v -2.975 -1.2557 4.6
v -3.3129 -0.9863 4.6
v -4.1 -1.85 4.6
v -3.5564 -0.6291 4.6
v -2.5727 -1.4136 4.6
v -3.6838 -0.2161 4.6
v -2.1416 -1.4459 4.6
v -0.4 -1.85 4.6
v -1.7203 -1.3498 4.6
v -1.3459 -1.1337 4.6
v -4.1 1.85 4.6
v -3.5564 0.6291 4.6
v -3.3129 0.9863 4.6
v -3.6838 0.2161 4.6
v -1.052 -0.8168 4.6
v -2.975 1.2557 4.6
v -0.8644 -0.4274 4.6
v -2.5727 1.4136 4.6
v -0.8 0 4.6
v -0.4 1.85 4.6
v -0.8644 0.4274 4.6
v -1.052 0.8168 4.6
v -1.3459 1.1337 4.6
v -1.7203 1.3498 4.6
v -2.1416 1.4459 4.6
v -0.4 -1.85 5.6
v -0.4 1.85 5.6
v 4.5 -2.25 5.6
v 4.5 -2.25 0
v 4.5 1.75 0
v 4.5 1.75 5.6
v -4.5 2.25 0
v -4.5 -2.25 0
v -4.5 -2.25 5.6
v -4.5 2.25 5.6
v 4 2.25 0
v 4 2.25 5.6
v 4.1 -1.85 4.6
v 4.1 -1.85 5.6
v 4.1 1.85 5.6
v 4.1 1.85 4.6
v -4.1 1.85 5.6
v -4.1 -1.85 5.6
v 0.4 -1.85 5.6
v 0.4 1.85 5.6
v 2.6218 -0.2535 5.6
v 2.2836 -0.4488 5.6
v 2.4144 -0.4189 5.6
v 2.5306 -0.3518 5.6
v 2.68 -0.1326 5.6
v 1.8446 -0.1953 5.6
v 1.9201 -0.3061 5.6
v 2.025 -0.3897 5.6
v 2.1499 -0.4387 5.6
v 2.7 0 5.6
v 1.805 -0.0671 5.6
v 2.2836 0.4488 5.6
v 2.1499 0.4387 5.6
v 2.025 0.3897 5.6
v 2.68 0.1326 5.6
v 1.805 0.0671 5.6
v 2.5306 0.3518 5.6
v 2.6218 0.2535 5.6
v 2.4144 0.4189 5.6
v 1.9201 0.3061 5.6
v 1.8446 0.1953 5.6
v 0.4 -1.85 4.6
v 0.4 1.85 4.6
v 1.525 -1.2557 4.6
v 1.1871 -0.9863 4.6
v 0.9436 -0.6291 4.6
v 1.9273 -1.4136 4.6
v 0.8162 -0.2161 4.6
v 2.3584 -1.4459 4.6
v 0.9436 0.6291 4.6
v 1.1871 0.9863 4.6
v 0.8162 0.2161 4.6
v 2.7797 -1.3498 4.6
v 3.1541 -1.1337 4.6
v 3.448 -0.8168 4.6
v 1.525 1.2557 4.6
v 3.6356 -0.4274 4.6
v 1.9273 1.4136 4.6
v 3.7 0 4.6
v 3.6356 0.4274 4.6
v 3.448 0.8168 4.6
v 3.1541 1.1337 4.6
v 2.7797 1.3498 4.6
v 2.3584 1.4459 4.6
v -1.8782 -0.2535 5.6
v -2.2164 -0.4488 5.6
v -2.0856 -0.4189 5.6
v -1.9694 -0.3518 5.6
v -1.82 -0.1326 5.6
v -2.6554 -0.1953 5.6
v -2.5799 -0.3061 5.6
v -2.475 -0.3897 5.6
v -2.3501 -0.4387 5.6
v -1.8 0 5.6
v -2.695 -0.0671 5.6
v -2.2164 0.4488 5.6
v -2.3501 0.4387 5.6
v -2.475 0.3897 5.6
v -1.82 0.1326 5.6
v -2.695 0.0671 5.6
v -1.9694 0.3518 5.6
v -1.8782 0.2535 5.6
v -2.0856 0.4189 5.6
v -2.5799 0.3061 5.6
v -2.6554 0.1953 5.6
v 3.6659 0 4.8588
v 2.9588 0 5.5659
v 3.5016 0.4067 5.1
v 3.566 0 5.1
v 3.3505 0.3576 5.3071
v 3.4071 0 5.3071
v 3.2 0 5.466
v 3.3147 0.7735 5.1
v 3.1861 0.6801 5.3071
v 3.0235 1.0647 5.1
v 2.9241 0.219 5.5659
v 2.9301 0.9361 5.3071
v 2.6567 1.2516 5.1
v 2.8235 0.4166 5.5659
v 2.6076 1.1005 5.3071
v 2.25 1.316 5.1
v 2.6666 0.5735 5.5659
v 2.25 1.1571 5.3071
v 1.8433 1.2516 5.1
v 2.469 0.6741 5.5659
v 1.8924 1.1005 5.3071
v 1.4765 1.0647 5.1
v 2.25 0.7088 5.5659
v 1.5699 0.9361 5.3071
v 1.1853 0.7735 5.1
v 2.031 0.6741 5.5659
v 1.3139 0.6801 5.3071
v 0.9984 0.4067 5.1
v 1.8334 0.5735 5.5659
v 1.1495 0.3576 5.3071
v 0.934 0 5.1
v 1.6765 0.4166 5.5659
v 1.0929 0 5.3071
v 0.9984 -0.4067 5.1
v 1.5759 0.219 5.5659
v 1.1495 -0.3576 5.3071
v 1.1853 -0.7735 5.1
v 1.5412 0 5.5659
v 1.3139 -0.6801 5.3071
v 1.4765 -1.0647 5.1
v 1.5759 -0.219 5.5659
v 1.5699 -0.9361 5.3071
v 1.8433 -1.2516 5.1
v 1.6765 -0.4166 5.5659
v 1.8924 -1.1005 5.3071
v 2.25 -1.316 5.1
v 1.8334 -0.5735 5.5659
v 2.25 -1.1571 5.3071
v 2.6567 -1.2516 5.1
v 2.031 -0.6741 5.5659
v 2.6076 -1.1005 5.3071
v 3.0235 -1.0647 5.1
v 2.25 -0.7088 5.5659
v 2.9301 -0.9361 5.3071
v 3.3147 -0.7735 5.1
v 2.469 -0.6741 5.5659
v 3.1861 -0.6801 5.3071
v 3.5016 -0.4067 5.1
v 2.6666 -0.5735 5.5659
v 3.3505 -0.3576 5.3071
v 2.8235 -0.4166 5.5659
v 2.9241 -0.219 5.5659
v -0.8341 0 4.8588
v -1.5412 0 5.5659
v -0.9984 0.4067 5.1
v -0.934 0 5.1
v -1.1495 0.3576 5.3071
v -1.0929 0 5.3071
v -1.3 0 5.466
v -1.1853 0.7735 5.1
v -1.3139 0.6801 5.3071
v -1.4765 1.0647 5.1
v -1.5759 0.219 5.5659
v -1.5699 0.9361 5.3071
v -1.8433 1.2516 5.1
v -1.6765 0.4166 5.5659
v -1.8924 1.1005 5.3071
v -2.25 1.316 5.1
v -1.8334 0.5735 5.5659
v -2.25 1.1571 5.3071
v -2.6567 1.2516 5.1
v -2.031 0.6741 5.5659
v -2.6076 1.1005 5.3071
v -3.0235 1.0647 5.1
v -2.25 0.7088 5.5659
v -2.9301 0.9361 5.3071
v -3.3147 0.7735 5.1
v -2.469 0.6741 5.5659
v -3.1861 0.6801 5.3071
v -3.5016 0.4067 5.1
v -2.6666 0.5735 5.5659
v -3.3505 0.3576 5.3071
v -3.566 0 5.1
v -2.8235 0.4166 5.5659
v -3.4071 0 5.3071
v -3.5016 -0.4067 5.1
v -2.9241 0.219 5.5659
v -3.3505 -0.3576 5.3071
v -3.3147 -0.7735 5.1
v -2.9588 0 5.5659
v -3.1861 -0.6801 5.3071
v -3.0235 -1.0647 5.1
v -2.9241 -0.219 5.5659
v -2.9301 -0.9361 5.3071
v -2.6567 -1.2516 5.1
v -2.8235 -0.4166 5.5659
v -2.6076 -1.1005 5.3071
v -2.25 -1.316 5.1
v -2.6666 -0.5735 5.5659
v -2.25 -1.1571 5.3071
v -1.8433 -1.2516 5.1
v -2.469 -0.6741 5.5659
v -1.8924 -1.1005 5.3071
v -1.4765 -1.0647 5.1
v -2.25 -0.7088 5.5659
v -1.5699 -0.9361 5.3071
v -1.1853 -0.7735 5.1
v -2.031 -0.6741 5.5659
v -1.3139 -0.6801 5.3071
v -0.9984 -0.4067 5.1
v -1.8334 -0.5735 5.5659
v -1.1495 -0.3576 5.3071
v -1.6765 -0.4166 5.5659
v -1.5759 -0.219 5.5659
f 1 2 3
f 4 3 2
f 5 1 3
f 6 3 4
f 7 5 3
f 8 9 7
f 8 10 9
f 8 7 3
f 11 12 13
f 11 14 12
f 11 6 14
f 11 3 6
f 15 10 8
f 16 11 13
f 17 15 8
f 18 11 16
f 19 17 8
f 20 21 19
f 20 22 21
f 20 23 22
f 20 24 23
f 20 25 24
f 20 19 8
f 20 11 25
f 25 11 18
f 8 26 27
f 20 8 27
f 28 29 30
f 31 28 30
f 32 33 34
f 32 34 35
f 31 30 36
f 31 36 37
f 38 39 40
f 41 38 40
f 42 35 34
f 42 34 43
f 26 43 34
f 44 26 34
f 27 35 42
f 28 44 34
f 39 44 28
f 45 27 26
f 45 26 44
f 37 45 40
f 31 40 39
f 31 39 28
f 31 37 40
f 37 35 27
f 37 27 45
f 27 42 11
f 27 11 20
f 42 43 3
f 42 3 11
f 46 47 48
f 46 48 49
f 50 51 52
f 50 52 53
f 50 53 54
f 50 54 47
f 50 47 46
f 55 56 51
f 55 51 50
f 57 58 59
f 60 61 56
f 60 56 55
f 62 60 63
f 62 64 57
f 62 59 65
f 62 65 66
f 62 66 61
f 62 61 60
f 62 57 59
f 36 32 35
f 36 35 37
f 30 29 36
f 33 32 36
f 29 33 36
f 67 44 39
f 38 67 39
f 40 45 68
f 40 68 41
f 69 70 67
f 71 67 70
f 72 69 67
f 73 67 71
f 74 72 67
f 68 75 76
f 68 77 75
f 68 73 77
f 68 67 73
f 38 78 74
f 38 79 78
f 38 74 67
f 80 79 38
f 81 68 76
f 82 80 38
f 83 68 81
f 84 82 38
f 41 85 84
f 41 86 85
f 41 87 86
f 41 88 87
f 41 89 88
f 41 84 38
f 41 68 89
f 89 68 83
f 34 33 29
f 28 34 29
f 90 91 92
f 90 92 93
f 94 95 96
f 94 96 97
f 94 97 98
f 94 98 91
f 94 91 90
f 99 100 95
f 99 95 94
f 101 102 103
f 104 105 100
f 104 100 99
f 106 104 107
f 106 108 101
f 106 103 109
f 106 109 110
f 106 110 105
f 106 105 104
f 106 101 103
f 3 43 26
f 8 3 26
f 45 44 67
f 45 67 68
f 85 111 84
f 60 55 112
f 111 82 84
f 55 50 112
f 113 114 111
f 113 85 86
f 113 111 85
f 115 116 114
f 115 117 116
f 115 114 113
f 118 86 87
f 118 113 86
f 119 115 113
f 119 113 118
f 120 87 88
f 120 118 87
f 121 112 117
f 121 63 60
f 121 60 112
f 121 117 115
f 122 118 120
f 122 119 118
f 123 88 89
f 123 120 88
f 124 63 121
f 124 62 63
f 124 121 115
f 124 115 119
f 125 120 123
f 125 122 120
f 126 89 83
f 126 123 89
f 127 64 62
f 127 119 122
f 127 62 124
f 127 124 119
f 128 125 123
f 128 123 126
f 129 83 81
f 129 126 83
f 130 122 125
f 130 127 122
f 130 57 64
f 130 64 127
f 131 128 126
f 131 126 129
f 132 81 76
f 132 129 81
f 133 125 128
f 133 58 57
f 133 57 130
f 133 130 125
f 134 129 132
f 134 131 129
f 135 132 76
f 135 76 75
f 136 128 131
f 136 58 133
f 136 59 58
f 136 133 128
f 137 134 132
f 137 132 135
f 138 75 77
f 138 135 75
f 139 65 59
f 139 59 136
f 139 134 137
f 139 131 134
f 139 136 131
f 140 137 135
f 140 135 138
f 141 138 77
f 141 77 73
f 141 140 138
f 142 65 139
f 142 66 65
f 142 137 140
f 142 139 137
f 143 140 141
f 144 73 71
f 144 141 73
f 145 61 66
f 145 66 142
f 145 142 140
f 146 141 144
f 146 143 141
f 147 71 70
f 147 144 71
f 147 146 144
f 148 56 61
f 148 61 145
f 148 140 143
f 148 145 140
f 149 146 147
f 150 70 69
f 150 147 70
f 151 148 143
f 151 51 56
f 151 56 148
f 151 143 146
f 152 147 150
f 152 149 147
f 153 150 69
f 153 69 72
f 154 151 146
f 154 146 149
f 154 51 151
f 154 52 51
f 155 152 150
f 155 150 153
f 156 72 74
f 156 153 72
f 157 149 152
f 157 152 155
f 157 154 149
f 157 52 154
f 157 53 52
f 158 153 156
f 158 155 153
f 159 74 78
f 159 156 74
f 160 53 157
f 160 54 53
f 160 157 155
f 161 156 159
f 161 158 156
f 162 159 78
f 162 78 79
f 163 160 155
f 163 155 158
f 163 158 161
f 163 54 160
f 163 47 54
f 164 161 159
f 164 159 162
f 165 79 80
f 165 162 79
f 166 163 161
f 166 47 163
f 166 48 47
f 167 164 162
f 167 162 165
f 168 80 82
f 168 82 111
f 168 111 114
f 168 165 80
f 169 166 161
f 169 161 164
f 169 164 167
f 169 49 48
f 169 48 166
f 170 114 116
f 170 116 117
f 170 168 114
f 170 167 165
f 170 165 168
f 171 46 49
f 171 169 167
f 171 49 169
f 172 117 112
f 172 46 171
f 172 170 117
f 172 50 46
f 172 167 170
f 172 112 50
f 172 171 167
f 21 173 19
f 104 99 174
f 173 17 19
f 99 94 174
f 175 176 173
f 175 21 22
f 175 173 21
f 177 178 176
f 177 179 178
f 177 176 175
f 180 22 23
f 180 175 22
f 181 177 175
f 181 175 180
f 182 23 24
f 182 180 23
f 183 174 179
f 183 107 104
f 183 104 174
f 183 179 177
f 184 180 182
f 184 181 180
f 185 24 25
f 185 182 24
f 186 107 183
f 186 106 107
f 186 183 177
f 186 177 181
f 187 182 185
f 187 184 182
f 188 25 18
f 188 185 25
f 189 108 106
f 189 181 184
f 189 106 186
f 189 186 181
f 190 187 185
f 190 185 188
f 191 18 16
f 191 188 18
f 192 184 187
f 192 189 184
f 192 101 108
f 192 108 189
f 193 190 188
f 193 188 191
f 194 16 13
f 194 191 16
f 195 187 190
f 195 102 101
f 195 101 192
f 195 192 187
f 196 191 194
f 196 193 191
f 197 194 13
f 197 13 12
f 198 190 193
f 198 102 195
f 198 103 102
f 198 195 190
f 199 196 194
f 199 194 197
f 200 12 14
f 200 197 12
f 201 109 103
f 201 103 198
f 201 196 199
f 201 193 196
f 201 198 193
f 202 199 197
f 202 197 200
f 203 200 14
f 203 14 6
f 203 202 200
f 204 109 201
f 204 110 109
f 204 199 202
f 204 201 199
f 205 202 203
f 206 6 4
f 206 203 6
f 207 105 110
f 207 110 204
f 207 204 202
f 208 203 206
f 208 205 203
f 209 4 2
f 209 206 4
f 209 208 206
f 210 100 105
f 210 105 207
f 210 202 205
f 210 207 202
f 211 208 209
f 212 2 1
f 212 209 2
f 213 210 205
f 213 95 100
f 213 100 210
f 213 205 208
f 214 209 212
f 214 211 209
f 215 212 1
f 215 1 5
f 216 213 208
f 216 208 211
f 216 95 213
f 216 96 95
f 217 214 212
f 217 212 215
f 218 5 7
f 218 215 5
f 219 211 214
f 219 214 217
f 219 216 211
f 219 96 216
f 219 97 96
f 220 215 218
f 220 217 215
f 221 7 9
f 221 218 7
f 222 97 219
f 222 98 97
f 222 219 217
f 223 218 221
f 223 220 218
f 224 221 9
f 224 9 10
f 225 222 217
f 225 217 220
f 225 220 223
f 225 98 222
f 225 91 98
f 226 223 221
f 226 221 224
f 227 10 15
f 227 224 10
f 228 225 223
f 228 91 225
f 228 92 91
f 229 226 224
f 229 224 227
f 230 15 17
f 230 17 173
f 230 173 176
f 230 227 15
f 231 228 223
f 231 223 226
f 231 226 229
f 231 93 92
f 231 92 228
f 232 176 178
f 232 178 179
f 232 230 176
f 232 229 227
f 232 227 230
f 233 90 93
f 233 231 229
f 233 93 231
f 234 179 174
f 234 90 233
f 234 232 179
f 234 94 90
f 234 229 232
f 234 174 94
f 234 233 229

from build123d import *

# Parameters (mm, degrees)
F0_W     = 9
F0_H     = 4.5
F1_DEPTH = 5.6
F2_W     = 3.7
F2_H     = 3.7
F2_R     = 1.45
F3_DEPTH = 1
F4_R     = 0.99999
F5_SIZE  = 0.5


# Not quite as in the source:
# - a fillet or chamfer is up to 0.001 mm smaller than in the source, because OpenCascade refuses the exact size


with BuildPart() as f1:
    # F0 (on Top) → F1 (new body)
    with BuildSketch(Plane.XY):
        Rectangle(F0_W, F0_H)
    extrude(amount=F1_DEPTH)

    # F2 (on face) → F3 (cut)
    with BuildSketch(Plane.XY.offset(5.6)):
        with Locations((-2.25, 0)):
            Rectangle(F2_W, F2_H)
        with Locations((-2.25, 0)):
            Circle(F2_R, mode=Mode.SUBTRACT)
        with Locations((2.25, 0)):
            Rectangle(F2_W, F2_H)
        with Locations((2.25, 0)):
            Circle(F2_R, mode=Mode.SUBTRACT)
    extrude(amount=-F3_DEPTH, mode=Mode.SUBTRACT)

    # F4 (radius 1 in the source; OpenCascade refuses exactly that, so slightly less here)
    f4_edges = [f1.edges().sort_by_distance(p)[0] for p in [
        (-3.7, 0, 5.6),
        (0.8, 0, 5.6),
    ]]
    fillet(f4_edges, radius=F4_R)

    # F5
    f5_edges = [f1.edges().sort_by_distance(p)[0] for p in [
        (4.5, 2.25, 2.8),
    ]]
    chamfer(f5_edges, length=F5_SIZE)


solid = f1.part
